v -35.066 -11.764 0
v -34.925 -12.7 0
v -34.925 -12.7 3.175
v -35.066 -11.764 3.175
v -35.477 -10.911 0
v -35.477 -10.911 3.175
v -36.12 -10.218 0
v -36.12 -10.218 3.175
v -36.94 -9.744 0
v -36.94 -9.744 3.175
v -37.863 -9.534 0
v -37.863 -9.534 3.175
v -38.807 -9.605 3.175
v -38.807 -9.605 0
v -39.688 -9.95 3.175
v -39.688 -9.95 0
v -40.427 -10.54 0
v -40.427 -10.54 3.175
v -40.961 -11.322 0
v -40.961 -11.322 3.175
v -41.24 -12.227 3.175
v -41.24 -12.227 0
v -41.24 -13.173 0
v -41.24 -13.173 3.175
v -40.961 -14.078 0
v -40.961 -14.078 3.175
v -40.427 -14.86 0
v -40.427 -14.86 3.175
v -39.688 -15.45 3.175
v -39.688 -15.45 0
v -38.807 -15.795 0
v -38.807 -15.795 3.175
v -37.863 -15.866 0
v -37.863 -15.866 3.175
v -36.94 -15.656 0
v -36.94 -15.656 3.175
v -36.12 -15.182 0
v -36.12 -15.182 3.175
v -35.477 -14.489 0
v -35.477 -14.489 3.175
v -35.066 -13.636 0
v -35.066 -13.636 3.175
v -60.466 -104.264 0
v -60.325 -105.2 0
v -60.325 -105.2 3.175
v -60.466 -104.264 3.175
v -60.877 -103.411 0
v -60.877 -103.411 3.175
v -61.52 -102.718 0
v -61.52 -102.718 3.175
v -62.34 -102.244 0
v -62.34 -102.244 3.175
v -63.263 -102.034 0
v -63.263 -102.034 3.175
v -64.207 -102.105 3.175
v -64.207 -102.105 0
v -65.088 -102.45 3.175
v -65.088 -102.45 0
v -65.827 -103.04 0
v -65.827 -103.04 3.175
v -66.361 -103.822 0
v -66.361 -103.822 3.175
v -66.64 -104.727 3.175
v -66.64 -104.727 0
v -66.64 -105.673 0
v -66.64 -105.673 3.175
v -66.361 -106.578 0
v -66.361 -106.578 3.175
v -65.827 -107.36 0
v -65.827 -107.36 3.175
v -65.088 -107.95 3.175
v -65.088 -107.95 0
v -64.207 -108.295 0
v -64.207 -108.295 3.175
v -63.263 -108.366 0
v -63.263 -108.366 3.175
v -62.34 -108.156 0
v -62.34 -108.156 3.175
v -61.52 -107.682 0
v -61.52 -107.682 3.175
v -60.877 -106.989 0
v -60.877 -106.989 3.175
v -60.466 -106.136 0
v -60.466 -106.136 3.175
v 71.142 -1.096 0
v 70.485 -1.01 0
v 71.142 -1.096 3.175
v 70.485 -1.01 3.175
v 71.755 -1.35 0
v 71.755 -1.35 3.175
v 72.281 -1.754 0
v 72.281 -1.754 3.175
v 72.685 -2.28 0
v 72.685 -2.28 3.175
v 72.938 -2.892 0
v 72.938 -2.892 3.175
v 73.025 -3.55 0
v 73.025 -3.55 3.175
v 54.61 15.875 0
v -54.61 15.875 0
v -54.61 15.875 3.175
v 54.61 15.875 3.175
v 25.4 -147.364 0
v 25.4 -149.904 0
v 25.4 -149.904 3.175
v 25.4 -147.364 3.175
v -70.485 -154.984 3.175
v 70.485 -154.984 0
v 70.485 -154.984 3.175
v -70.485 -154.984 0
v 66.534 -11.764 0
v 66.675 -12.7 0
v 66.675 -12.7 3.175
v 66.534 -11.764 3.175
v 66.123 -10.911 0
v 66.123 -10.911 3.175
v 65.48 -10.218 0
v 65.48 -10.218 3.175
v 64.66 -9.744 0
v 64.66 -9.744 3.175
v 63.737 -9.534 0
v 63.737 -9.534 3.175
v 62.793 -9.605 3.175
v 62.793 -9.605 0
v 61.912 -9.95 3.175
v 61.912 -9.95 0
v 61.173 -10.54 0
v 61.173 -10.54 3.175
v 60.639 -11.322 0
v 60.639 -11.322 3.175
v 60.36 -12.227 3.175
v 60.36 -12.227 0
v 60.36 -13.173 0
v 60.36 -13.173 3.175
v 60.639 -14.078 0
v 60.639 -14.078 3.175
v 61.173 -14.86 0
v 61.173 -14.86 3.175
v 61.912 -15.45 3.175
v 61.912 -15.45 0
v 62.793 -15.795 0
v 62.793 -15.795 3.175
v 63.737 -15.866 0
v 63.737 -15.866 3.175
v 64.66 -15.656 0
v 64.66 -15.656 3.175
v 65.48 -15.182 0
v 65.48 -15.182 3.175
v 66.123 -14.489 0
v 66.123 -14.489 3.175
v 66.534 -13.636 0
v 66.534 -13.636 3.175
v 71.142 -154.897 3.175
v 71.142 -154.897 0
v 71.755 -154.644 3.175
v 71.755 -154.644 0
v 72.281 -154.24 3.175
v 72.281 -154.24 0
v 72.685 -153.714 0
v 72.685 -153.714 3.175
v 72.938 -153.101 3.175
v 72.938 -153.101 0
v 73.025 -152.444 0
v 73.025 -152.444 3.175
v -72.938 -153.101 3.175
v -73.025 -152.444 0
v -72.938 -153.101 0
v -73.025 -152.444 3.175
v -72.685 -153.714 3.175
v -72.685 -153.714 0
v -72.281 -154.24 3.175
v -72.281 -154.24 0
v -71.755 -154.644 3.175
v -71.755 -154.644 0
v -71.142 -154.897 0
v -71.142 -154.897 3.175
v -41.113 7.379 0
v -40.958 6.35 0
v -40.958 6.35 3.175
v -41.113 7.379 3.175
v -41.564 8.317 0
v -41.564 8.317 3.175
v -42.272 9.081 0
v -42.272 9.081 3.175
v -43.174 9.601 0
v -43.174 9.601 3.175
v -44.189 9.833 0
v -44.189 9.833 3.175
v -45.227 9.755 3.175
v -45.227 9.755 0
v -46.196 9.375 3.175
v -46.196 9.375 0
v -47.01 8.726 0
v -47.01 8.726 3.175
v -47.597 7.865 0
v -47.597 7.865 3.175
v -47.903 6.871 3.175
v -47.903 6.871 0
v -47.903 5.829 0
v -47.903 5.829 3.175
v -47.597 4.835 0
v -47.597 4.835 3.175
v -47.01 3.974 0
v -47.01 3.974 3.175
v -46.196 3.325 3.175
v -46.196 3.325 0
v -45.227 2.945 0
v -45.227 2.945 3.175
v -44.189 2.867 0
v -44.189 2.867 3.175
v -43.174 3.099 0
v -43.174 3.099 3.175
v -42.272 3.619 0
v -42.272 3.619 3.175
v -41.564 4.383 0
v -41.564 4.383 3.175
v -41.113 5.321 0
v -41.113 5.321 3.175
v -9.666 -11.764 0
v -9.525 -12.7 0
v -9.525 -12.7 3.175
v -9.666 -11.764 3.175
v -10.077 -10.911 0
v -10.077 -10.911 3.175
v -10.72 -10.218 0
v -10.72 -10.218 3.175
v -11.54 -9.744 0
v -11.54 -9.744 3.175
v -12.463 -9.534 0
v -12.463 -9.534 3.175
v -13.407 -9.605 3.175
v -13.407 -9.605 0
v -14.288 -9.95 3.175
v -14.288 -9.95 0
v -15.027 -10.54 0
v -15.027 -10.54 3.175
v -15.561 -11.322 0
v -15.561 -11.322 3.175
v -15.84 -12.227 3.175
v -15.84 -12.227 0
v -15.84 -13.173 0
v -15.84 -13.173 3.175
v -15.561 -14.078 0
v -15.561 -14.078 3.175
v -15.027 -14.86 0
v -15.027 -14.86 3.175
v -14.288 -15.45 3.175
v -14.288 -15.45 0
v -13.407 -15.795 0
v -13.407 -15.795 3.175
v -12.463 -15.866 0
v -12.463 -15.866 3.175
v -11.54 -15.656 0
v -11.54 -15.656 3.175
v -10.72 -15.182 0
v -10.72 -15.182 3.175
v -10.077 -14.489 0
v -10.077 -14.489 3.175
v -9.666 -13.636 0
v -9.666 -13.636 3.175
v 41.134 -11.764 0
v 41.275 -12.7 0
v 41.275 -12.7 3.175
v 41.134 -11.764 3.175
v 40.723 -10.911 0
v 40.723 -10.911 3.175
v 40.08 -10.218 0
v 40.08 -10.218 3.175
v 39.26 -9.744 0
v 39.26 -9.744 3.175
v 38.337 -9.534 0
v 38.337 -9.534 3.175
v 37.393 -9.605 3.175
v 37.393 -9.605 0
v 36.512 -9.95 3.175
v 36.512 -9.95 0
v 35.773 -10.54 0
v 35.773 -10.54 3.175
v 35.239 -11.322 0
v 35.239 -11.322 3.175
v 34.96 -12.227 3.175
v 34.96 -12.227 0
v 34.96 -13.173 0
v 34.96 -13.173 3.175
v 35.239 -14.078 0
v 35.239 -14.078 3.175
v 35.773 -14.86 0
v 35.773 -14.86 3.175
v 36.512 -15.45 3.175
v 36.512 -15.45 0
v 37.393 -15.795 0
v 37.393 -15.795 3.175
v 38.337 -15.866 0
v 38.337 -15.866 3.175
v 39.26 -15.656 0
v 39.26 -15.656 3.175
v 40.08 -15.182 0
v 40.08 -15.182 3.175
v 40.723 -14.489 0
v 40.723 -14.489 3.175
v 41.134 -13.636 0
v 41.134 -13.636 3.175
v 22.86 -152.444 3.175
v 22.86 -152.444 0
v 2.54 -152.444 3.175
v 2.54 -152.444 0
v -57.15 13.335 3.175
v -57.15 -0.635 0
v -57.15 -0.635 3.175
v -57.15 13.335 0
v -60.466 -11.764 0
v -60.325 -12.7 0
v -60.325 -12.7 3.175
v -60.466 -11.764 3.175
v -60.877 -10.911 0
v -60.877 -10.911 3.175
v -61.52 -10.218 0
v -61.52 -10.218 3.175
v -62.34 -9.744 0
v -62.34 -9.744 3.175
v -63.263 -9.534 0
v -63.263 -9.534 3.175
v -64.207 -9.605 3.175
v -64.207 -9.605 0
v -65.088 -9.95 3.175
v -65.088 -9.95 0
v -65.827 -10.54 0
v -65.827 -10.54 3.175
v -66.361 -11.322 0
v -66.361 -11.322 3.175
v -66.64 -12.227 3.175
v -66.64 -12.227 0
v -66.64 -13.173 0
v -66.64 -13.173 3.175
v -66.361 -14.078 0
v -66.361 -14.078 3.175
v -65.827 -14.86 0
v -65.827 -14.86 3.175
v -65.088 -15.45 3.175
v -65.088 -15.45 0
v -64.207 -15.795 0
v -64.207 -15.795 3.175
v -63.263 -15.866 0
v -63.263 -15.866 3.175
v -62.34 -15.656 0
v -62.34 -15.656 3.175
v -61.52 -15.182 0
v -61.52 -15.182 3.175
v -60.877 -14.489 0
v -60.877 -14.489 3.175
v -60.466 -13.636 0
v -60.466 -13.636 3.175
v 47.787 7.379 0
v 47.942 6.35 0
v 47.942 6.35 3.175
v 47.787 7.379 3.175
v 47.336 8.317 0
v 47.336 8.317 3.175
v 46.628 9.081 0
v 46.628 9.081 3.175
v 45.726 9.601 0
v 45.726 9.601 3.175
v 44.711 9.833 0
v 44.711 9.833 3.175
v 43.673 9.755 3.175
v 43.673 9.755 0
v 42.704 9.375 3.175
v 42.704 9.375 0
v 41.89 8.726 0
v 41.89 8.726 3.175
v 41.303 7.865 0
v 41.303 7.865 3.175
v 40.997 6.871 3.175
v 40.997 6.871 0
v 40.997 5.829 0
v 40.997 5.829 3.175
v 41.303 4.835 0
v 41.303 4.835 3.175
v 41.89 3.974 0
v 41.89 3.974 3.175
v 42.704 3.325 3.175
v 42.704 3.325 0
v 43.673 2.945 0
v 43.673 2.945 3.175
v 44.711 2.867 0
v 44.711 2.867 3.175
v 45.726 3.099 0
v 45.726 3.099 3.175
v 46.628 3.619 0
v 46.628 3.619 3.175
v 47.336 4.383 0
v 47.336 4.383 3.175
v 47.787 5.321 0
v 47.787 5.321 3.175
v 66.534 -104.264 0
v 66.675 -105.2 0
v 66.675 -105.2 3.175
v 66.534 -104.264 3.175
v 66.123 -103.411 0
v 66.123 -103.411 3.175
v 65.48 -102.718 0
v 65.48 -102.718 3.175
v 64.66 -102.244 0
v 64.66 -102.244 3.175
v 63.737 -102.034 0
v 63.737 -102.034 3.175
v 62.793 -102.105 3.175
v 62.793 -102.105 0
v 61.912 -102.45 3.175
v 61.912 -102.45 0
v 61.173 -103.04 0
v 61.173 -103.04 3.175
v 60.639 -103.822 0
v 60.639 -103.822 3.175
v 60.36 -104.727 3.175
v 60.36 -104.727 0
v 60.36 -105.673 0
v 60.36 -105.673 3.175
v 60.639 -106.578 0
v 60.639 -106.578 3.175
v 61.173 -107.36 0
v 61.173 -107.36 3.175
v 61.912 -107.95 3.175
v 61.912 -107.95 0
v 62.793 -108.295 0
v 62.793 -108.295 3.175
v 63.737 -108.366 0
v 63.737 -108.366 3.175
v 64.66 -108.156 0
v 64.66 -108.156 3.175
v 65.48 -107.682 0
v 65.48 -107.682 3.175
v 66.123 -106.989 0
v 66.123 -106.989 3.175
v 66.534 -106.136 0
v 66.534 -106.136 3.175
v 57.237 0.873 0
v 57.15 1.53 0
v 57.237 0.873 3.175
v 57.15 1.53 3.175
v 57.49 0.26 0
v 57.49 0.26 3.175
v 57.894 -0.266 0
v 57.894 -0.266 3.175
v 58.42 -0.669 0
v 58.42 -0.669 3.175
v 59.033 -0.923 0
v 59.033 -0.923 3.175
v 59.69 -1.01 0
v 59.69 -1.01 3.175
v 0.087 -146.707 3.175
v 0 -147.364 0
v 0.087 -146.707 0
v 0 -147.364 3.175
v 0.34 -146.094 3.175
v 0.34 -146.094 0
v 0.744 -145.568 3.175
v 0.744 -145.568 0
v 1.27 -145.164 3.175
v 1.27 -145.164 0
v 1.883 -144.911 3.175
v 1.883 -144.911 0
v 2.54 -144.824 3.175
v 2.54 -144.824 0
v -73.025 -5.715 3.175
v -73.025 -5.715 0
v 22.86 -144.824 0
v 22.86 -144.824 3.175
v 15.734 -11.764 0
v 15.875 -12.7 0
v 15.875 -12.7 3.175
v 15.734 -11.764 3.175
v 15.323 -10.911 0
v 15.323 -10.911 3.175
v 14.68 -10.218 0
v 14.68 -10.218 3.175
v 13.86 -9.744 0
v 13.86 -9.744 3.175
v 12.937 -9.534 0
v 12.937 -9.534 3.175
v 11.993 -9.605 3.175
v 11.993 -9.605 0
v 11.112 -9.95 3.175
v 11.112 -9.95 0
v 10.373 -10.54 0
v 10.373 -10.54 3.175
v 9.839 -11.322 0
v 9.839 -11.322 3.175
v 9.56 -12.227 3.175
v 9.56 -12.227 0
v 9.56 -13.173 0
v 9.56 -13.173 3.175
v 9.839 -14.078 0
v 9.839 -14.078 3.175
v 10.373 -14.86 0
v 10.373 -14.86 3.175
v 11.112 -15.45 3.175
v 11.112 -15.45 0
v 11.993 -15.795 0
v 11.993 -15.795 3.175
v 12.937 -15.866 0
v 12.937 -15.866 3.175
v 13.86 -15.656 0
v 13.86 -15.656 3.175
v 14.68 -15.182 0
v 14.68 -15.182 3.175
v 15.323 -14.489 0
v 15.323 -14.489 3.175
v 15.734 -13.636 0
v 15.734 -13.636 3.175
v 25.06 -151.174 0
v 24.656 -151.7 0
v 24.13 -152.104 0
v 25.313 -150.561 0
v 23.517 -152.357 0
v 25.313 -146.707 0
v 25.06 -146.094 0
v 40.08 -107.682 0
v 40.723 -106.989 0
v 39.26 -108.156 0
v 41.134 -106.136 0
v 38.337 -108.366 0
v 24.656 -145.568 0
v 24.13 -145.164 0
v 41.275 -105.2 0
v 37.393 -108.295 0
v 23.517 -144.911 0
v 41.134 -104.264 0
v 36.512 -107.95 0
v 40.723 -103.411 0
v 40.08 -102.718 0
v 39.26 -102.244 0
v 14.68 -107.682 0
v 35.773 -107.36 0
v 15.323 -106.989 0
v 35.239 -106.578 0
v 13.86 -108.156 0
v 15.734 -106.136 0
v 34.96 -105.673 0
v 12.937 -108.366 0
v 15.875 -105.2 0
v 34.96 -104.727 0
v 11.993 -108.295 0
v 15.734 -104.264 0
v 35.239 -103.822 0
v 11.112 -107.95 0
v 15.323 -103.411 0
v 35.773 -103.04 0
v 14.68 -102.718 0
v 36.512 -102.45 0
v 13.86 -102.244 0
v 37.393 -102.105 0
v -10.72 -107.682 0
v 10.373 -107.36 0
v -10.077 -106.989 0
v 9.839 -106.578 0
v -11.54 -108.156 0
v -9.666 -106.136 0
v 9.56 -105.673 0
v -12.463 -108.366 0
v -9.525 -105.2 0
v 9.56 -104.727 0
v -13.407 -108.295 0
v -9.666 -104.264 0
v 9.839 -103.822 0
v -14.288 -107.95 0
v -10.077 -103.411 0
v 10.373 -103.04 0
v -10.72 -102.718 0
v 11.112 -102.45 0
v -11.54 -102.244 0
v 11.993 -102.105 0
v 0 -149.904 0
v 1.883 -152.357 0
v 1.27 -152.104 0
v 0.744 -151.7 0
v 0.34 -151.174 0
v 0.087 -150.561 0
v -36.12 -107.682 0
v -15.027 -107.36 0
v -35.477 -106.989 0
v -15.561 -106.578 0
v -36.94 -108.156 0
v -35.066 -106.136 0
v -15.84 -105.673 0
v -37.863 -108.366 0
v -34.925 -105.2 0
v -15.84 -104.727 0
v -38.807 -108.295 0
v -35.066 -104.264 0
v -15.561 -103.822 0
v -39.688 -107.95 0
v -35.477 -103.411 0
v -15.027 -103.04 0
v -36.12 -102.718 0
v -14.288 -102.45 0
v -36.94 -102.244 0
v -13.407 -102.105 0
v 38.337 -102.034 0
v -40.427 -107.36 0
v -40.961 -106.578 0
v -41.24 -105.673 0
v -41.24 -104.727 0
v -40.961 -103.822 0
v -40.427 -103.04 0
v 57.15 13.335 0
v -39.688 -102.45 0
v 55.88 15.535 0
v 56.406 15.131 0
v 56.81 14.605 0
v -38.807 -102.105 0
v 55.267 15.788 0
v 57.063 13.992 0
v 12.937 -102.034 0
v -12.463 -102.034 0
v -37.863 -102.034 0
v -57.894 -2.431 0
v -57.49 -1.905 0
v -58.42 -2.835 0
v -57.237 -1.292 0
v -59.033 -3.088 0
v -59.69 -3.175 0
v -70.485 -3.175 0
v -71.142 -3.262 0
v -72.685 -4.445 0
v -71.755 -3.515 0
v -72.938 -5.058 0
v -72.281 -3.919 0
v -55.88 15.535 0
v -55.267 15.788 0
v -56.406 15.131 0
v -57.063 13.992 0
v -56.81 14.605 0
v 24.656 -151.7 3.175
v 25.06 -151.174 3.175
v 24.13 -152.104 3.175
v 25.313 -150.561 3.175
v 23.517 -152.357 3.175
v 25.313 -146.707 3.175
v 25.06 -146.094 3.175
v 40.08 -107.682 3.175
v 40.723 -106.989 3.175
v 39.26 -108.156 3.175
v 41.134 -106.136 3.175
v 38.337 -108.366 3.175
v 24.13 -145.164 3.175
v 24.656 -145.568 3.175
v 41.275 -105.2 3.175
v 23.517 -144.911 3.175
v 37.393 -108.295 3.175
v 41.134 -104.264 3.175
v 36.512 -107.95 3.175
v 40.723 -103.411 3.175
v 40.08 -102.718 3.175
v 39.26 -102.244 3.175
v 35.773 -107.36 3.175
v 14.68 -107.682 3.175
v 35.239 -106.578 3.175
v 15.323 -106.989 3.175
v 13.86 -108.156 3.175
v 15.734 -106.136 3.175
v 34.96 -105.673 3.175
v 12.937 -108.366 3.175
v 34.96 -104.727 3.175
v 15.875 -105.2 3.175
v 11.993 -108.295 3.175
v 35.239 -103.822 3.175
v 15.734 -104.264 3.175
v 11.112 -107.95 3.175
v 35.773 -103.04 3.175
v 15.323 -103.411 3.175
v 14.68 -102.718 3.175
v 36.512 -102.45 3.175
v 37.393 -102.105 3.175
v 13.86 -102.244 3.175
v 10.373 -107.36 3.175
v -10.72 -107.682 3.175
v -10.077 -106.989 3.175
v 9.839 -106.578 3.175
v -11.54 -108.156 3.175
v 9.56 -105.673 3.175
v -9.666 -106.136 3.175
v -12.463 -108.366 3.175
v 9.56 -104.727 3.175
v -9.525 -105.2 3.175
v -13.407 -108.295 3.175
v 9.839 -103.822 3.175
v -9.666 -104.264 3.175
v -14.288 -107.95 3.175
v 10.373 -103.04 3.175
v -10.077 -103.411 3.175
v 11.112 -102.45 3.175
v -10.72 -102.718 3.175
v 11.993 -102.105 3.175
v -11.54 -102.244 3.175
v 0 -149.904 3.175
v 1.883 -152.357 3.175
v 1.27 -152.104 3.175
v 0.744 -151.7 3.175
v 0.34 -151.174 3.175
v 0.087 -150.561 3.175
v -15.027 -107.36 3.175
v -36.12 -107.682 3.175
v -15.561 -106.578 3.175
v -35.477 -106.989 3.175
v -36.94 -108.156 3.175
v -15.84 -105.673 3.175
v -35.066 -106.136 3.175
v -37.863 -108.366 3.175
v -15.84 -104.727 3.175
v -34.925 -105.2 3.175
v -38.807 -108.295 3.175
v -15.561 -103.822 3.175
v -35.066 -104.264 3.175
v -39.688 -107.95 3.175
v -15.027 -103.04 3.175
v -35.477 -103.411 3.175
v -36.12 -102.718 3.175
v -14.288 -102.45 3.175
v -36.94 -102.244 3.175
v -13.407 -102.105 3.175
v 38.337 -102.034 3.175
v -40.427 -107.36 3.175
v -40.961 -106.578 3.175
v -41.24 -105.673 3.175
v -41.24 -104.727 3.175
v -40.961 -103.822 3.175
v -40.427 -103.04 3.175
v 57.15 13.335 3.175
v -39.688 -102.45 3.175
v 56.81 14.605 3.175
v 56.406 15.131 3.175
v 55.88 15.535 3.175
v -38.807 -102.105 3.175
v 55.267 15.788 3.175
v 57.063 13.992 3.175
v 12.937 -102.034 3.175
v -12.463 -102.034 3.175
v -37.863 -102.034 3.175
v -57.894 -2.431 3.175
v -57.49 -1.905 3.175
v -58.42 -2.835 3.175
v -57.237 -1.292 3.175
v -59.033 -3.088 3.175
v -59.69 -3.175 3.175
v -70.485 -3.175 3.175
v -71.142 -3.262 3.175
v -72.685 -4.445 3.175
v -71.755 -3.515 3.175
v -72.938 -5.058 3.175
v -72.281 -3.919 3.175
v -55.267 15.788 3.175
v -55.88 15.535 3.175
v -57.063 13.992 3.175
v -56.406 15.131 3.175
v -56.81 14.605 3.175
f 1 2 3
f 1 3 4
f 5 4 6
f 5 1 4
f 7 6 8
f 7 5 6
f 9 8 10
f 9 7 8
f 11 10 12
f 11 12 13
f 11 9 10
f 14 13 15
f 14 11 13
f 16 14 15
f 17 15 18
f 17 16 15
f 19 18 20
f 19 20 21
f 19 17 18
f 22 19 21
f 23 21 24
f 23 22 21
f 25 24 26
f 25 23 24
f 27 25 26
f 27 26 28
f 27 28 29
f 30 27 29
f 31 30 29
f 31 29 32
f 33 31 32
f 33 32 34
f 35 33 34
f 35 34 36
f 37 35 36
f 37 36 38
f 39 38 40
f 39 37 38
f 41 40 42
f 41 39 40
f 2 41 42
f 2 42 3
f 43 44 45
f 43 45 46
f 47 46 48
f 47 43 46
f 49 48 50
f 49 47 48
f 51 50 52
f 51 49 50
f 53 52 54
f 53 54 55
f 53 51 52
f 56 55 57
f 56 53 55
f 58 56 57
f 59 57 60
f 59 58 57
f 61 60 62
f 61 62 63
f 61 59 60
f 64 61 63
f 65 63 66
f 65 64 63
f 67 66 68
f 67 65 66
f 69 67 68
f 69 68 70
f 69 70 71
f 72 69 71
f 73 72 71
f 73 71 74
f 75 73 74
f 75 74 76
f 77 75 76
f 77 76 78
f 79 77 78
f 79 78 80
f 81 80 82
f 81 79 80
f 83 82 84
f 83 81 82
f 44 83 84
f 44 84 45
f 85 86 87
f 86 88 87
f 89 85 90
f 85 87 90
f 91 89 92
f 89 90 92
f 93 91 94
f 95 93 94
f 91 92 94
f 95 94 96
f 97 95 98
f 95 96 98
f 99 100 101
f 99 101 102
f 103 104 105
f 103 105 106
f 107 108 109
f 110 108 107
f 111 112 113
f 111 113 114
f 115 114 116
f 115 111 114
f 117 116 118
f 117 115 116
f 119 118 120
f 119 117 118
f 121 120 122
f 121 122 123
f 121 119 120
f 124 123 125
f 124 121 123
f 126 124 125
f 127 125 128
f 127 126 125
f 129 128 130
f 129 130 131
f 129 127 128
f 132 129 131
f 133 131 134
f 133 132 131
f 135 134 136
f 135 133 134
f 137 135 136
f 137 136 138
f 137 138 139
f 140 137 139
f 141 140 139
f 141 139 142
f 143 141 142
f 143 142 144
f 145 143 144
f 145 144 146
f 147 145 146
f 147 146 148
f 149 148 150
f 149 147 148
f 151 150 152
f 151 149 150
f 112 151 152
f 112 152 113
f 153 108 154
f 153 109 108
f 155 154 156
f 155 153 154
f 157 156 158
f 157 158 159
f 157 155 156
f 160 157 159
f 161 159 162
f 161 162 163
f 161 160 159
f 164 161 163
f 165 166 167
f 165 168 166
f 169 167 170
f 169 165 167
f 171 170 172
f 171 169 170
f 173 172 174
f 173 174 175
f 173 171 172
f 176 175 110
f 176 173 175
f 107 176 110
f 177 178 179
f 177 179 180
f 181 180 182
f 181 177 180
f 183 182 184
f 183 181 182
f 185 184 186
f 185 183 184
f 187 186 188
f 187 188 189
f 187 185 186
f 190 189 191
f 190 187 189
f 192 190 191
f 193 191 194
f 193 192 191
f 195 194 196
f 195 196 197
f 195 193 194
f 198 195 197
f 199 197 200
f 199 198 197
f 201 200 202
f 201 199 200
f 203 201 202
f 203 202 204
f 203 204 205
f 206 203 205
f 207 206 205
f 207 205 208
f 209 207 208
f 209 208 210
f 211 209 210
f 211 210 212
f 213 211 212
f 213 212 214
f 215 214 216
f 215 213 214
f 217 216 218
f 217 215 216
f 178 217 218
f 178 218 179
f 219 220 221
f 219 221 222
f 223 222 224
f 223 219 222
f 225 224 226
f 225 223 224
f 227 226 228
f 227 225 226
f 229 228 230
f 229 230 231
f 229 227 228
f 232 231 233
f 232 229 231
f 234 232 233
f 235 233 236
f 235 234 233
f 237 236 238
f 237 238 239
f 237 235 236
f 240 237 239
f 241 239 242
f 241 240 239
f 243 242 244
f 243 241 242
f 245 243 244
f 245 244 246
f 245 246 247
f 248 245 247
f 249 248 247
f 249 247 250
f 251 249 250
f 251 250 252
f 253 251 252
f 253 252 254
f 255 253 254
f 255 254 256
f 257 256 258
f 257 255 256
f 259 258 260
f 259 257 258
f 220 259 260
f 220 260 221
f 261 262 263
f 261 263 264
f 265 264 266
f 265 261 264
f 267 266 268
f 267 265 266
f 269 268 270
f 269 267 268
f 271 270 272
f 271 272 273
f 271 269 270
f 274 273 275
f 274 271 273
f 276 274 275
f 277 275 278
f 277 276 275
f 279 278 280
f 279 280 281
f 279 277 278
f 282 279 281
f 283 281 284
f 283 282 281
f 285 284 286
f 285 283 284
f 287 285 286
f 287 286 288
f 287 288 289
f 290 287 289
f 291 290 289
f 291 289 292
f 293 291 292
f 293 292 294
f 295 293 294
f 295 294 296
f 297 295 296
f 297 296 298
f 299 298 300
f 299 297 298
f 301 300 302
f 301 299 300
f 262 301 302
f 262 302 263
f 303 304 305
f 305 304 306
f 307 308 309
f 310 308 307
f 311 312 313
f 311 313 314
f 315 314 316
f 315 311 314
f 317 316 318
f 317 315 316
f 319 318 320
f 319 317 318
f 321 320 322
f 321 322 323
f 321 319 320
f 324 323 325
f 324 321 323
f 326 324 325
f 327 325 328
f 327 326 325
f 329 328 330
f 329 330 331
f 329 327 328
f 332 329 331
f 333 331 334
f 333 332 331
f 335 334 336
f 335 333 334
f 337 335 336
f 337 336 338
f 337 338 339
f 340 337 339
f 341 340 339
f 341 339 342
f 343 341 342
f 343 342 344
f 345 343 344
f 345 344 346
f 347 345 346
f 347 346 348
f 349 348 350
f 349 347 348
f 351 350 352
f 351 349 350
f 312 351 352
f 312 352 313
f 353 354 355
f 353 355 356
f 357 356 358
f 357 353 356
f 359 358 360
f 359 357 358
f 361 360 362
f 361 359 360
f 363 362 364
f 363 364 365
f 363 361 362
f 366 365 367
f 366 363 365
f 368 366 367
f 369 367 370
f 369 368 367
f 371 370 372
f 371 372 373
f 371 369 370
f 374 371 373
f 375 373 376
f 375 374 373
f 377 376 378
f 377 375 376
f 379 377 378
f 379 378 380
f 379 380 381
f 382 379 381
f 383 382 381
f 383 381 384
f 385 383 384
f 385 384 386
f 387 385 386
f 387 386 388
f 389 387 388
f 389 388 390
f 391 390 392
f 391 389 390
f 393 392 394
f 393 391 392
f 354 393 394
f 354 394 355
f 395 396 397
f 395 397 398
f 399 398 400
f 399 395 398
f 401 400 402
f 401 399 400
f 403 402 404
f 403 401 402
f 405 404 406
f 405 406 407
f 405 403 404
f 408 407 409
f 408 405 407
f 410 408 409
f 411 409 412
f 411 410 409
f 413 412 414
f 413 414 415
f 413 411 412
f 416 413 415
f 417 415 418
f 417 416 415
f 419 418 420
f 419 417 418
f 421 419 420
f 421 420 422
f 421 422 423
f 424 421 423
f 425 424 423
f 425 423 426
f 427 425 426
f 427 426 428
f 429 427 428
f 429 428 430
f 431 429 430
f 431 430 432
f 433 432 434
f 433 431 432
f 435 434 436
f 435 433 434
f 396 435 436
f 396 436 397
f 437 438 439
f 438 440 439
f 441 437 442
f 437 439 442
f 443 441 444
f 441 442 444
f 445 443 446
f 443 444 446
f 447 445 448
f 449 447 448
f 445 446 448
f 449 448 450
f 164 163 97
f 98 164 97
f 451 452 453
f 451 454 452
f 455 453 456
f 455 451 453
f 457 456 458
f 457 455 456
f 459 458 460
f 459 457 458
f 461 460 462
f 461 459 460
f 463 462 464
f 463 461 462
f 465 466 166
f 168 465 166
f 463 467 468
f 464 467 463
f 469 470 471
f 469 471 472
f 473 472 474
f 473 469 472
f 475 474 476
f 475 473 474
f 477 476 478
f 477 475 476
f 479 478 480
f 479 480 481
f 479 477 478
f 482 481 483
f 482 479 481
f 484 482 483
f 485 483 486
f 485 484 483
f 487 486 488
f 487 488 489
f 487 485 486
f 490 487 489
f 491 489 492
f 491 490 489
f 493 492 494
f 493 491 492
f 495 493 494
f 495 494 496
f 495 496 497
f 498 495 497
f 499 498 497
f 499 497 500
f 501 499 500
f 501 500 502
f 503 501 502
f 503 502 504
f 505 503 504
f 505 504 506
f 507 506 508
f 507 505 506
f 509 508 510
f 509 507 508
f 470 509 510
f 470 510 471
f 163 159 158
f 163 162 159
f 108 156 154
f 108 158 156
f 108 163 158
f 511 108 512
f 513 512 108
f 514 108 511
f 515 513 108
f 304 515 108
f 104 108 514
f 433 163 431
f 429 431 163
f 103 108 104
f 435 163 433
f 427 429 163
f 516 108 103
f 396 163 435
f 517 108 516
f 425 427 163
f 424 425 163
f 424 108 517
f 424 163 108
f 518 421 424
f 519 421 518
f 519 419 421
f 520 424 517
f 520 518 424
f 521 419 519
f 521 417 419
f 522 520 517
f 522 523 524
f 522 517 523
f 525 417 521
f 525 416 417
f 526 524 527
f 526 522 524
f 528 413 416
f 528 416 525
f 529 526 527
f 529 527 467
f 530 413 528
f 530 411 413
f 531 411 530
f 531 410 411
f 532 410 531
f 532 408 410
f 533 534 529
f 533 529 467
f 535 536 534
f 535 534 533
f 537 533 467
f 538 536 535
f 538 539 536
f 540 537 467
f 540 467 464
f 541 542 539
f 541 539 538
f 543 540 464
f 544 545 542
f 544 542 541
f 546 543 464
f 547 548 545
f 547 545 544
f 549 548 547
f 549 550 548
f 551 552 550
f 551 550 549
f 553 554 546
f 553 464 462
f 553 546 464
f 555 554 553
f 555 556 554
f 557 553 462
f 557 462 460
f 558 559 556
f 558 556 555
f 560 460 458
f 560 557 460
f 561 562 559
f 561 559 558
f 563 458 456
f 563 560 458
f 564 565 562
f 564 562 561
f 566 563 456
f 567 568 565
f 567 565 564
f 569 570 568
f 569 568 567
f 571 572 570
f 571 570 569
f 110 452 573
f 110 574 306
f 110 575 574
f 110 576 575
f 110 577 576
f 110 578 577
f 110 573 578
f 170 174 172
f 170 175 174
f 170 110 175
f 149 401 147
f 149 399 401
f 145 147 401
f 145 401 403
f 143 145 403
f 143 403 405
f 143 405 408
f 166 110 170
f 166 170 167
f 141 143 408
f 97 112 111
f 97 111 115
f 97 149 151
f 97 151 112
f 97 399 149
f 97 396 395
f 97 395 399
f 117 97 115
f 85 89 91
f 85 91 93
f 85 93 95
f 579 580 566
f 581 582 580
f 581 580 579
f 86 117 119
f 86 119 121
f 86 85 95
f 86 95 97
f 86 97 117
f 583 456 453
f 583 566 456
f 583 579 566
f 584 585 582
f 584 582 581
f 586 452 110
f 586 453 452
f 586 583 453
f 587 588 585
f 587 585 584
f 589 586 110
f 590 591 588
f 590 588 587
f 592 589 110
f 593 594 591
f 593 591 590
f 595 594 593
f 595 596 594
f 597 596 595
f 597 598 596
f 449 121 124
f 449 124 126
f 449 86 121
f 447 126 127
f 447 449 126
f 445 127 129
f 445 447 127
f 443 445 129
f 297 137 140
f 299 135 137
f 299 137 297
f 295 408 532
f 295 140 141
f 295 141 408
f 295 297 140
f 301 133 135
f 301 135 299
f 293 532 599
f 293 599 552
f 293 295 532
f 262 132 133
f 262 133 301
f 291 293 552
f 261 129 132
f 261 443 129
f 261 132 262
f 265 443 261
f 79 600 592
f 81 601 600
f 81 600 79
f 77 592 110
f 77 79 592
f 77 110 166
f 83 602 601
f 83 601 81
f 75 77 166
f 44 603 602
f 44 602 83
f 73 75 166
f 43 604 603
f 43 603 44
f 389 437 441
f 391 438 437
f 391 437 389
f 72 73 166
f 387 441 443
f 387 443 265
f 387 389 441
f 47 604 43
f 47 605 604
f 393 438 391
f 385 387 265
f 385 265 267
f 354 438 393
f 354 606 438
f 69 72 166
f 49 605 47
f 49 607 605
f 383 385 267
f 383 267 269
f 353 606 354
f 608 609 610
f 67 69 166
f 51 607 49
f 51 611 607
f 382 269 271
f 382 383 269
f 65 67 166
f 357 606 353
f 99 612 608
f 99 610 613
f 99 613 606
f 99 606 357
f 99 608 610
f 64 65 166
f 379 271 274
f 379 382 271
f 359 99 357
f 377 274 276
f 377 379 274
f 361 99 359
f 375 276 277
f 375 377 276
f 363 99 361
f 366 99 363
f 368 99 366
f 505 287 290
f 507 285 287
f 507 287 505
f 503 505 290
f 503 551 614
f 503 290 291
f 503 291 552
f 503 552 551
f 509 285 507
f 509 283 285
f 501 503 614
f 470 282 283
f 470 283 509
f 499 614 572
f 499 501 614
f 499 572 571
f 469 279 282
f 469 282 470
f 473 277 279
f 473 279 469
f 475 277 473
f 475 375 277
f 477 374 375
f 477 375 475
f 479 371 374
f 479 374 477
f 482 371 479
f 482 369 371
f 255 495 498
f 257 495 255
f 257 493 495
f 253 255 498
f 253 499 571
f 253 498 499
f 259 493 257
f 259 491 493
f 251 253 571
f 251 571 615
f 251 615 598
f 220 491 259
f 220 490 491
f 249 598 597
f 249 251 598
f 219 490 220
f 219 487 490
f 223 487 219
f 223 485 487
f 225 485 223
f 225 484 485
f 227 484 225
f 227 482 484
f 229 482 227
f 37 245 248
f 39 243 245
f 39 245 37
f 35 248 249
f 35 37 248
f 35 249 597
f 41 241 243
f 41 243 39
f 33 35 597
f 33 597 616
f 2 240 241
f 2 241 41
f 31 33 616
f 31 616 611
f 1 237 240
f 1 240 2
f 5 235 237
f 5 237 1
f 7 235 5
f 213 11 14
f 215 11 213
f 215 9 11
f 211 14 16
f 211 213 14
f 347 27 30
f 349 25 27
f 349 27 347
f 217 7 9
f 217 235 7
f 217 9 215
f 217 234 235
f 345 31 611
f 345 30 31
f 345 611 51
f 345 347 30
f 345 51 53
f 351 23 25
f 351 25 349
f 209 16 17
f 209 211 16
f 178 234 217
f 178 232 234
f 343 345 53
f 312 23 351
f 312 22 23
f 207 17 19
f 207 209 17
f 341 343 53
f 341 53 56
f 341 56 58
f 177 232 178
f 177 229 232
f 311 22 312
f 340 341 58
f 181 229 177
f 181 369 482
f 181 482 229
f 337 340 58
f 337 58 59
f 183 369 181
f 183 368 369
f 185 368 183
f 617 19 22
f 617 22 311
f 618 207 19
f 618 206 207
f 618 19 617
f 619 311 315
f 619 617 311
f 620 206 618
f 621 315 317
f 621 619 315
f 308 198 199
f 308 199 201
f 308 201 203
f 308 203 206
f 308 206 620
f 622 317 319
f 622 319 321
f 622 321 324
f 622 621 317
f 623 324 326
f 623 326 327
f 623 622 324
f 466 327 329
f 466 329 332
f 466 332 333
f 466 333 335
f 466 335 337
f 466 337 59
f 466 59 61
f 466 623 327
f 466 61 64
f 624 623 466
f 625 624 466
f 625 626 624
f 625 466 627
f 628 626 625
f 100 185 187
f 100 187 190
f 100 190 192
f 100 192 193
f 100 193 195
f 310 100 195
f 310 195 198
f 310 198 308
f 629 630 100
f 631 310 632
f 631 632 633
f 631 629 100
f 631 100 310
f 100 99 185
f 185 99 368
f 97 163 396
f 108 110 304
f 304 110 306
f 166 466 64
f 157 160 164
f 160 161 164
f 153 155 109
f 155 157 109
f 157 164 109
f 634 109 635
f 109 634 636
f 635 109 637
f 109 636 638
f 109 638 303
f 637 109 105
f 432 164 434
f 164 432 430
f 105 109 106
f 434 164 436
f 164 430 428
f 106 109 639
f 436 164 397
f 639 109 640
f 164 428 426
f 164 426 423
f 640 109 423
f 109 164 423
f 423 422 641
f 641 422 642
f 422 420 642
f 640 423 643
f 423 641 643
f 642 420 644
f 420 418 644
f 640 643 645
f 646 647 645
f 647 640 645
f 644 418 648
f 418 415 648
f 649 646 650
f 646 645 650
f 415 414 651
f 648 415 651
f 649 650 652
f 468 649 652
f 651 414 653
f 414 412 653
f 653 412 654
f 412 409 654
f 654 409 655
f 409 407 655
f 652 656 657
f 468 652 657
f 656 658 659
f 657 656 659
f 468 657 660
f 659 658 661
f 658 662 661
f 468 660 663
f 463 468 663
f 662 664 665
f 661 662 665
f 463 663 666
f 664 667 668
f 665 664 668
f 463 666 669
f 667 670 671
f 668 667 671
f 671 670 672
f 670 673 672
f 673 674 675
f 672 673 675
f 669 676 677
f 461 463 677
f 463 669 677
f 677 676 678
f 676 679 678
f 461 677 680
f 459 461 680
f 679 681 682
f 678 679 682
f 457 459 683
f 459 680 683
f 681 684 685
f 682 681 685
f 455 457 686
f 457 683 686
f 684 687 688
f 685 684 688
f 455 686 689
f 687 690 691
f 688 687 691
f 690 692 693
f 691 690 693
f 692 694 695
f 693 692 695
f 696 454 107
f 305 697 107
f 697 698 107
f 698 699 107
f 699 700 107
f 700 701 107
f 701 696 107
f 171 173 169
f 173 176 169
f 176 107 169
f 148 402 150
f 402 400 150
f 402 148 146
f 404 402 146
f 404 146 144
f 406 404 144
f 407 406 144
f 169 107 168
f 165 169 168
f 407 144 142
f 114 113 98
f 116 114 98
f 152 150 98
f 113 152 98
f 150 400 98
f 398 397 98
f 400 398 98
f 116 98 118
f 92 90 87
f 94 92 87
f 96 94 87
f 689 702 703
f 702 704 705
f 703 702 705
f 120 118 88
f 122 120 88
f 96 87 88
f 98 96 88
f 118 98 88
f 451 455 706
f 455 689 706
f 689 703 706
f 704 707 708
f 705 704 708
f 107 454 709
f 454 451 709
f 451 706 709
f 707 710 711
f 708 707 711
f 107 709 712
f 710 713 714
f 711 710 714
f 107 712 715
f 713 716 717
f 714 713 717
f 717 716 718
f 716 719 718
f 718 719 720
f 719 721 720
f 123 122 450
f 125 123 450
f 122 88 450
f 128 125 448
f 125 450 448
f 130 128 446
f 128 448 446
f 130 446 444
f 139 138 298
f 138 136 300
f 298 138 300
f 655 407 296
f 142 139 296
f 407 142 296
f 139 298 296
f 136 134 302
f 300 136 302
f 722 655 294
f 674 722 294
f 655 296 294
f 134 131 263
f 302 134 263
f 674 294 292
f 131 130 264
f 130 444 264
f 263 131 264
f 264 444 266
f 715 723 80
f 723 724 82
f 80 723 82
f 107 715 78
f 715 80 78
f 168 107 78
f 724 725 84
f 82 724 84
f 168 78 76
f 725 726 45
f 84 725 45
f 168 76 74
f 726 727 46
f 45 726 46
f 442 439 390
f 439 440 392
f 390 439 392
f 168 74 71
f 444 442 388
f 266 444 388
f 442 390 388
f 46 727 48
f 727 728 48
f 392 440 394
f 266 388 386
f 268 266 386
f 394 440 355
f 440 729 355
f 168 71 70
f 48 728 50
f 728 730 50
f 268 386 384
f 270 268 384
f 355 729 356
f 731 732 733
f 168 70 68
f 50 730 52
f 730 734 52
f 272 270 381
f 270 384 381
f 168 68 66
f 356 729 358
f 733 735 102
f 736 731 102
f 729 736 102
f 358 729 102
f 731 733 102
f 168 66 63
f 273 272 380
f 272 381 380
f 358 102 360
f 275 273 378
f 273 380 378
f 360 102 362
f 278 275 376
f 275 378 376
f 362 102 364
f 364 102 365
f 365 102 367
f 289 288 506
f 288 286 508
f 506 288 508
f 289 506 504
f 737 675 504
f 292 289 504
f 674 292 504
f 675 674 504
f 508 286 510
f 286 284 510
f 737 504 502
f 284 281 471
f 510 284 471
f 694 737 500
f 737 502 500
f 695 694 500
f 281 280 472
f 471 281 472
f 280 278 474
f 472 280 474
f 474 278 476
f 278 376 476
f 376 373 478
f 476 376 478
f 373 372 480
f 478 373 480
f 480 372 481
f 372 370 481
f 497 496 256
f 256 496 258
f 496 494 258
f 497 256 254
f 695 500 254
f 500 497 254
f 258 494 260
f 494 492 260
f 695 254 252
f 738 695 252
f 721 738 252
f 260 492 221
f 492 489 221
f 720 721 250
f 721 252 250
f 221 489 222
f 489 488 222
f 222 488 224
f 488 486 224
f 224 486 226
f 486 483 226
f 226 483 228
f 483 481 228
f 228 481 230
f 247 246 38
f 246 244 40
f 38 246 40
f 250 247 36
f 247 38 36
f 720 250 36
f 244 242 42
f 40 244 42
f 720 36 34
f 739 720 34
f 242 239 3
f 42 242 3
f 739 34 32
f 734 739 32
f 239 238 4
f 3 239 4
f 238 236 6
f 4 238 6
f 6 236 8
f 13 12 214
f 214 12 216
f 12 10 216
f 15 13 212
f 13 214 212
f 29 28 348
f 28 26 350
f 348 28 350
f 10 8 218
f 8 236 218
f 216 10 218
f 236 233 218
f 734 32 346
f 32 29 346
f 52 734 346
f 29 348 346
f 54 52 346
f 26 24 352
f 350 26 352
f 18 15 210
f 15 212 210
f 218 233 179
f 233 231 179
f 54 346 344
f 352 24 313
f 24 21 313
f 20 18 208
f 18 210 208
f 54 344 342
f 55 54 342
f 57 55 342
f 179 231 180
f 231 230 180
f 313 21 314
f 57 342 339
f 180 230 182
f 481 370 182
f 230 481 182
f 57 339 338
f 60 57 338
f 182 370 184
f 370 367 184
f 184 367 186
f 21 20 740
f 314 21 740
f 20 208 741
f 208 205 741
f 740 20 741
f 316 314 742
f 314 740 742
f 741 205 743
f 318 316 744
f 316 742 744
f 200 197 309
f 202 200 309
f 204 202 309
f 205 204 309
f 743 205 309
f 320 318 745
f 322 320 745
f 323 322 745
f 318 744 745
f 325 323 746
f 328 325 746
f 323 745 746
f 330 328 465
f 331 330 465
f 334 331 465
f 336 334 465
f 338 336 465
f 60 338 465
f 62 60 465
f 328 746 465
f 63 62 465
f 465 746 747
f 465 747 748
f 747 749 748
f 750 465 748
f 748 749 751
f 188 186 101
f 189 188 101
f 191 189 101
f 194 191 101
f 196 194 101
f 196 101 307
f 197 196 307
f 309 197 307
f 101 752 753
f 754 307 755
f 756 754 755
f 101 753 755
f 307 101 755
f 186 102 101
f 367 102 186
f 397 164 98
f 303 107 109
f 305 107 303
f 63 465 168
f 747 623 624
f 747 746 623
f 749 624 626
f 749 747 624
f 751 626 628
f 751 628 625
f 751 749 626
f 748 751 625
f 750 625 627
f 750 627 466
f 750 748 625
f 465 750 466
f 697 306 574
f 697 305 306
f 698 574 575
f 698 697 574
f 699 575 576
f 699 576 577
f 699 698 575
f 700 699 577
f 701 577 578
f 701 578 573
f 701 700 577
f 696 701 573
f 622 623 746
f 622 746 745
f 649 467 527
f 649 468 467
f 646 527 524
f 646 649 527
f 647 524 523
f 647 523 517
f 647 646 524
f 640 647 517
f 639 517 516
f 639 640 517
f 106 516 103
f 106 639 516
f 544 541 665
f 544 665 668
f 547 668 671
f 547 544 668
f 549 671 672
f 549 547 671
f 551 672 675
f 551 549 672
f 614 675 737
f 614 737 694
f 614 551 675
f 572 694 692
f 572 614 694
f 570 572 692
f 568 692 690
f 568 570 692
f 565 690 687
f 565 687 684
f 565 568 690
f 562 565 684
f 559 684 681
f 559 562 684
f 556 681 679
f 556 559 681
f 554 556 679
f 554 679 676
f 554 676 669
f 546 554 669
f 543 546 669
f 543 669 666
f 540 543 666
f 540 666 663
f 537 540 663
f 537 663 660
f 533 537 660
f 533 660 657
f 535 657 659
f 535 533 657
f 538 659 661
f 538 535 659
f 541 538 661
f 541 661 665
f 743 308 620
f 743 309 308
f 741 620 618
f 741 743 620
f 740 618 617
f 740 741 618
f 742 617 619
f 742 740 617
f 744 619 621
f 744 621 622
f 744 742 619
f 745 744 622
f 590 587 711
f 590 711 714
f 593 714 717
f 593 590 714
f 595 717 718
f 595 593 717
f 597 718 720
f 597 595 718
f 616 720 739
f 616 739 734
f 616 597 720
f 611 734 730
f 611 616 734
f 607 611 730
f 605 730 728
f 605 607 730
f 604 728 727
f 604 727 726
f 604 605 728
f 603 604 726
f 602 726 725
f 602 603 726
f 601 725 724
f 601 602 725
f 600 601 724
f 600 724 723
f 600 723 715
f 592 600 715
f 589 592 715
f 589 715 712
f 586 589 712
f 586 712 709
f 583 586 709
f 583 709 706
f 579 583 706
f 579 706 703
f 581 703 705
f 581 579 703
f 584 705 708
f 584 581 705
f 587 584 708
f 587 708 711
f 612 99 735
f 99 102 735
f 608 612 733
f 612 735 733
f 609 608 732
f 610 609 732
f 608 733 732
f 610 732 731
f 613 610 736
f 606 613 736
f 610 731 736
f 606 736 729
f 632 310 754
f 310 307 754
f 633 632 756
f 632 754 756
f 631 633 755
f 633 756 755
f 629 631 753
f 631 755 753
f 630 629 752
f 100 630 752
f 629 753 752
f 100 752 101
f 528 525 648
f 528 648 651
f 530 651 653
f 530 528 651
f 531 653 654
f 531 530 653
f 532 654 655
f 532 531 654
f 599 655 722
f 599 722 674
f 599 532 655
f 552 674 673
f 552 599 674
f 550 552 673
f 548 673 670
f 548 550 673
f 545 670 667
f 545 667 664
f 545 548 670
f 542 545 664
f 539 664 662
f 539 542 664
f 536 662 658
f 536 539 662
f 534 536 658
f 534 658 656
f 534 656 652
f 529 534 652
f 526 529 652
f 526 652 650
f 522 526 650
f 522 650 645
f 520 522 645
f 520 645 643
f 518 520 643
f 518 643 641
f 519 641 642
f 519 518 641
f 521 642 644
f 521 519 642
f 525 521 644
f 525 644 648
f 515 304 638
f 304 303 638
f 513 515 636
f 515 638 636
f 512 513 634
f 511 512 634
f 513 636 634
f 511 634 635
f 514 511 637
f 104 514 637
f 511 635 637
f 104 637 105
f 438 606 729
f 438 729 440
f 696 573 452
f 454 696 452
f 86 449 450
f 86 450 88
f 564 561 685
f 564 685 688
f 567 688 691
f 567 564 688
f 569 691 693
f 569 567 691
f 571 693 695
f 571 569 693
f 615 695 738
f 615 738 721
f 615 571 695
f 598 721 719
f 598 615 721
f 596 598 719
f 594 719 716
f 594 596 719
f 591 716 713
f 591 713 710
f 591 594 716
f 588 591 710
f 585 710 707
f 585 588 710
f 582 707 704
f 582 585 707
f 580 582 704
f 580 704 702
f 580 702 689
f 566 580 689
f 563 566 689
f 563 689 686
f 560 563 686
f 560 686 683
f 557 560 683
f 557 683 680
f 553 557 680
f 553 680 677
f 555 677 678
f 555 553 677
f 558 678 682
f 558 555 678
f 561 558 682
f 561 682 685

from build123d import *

# Parameters (mm, degrees)
SKETCH1_R           = 3.4925
SKETCH1_R_2         = 3.175
BOSS_EXTRUDE1_DEPTH = 3.175
FILLET2_R           = 2.54
FILLET3_R           = 2.54
SKETCH4_W           = 25.4
SKETCH4_H           = 7.62
CUT_EXTRUDE1_DEPTH  = 172.355687034
FILLET4_R           = 2.54


with BuildPart() as part:
    # Sketch1 → Boss-Extrude1 (new body)
    with BuildSketch(Plane.XY):
        Polygon((-57.15, -3.175), (-57.15, 15.875), (57.15, 15.875), (57.15, -1.009681966), (73.025, -1.009681966), (73.025, -27.559), (73.025, -154.983999912), (-73.025, -154.983999912), (-73.025, -27.559), (-73.025, -3.175), align=None)
        with Locations((-44.45, 6.35)):
            Circle(SKETCH1_R, mode=Mode.SUBTRACT)
        with Locations((44.45, 6.35)):
            Circle(SKETCH1_R, mode=Mode.SUBTRACT)
        with Locations((-63.5, -12.7)):
            Circle(SKETCH1_R_2, mode=Mode.SUBTRACT)
        with Locations((-38.1, -12.7)):
            Circle(SKETCH1_R_2, mode=Mode.SUBTRACT)
        with Locations((-12.7, -12.7)):
            Circle(SKETCH1_R_2, mode=Mode.SUBTRACT)
        with Locations((12.7, -12.7)):
            Circle(SKETCH1_R_2, mode=Mode.SUBTRACT)
        with Locations((38.1, -12.7)):
            Circle(SKETCH1_R_2, mode=Mode.SUBTRACT)
        with Locations((63.5, -12.7)):
            Circle(SKETCH1_R_2, mode=Mode.SUBTRACT)
        with Locations((-63.5, -105.199999912)):
            Circle(SKETCH1_R_2, mode=Mode.SUBTRACT)
        with Locations((-38.1, -105.199999912)):
            Circle(SKETCH1_R_2, mode=Mode.SUBTRACT)
        with Locations((-12.7, -105.199999912)):
            Circle(SKETCH1_R_2, mode=Mode.SUBTRACT)
        with Locations((12.7, -105.199999912)):
            Circle(SKETCH1_R_2, mode=Mode.SUBTRACT)
        with Locations((38.1, -105.199999912)):
            Circle(SKETCH1_R_2, mode=Mode.SUBTRACT)
        with Locations((63.5, -105.199999912)):
            Circle(SKETCH1_R_2, mode=Mode.SUBTRACT)
    extrude(amount=BOSS_EXTRUDE1_DEPTH)

    # Fillet2
    fillet2_edges = [part.edges().sort_by_distance(p)[0] for p in [
        (-73.025, -154.983999912, 1.5875),
        (-73.025, -3.175, 1.5875),
        (-57.15, 15.875, 1.5875),
        (57.15, 15.875, 1.5875),
        (73.025, -1.009681966, 1.5875),
        (73.025, -154.983999912, 1.5875),
    ]]
    fillet(fillet2_edges, radius=FILLET2_R)

    # Fillet3
    fillet3_edges = [part.edges().sort_by_distance(p)[0] for p in [
        (-57.15, -3.175, 1.5875),
        (57.15, -1.009681966, 1.5875),
    ]]
    fillet(fillet3_edges, radius=FILLET3_R)

    # Sketch4 → Cut-Extrude1 (cut, through all)
    with BuildSketch(Plane(origin=(0, 0, 0), x_dir=(-1, 0, 0), z_dir=(0, 0, -1))):
        with Locations((-12.7, -148.633999912)):
            Rectangle(SKETCH4_W, SKETCH4_H)
    extrude(amount=-CUT_EXTRUDE1_DEPTH, mode=Mode.SUBTRACT)

    # Fillet4
    fillet4_edges = [part.edges().sort_by_distance(p)[0] for p in [
        (0, -144.823999912, 1.5875),
        (0, -152.443999912, 1.5875),
        (25.4, -152.443999912, 1.5875),
        (25.4, -144.823999912, 1.5875),
    ]]
    fillet(fillet4_edges, radius=FILLET4_R)


solid = part.part
